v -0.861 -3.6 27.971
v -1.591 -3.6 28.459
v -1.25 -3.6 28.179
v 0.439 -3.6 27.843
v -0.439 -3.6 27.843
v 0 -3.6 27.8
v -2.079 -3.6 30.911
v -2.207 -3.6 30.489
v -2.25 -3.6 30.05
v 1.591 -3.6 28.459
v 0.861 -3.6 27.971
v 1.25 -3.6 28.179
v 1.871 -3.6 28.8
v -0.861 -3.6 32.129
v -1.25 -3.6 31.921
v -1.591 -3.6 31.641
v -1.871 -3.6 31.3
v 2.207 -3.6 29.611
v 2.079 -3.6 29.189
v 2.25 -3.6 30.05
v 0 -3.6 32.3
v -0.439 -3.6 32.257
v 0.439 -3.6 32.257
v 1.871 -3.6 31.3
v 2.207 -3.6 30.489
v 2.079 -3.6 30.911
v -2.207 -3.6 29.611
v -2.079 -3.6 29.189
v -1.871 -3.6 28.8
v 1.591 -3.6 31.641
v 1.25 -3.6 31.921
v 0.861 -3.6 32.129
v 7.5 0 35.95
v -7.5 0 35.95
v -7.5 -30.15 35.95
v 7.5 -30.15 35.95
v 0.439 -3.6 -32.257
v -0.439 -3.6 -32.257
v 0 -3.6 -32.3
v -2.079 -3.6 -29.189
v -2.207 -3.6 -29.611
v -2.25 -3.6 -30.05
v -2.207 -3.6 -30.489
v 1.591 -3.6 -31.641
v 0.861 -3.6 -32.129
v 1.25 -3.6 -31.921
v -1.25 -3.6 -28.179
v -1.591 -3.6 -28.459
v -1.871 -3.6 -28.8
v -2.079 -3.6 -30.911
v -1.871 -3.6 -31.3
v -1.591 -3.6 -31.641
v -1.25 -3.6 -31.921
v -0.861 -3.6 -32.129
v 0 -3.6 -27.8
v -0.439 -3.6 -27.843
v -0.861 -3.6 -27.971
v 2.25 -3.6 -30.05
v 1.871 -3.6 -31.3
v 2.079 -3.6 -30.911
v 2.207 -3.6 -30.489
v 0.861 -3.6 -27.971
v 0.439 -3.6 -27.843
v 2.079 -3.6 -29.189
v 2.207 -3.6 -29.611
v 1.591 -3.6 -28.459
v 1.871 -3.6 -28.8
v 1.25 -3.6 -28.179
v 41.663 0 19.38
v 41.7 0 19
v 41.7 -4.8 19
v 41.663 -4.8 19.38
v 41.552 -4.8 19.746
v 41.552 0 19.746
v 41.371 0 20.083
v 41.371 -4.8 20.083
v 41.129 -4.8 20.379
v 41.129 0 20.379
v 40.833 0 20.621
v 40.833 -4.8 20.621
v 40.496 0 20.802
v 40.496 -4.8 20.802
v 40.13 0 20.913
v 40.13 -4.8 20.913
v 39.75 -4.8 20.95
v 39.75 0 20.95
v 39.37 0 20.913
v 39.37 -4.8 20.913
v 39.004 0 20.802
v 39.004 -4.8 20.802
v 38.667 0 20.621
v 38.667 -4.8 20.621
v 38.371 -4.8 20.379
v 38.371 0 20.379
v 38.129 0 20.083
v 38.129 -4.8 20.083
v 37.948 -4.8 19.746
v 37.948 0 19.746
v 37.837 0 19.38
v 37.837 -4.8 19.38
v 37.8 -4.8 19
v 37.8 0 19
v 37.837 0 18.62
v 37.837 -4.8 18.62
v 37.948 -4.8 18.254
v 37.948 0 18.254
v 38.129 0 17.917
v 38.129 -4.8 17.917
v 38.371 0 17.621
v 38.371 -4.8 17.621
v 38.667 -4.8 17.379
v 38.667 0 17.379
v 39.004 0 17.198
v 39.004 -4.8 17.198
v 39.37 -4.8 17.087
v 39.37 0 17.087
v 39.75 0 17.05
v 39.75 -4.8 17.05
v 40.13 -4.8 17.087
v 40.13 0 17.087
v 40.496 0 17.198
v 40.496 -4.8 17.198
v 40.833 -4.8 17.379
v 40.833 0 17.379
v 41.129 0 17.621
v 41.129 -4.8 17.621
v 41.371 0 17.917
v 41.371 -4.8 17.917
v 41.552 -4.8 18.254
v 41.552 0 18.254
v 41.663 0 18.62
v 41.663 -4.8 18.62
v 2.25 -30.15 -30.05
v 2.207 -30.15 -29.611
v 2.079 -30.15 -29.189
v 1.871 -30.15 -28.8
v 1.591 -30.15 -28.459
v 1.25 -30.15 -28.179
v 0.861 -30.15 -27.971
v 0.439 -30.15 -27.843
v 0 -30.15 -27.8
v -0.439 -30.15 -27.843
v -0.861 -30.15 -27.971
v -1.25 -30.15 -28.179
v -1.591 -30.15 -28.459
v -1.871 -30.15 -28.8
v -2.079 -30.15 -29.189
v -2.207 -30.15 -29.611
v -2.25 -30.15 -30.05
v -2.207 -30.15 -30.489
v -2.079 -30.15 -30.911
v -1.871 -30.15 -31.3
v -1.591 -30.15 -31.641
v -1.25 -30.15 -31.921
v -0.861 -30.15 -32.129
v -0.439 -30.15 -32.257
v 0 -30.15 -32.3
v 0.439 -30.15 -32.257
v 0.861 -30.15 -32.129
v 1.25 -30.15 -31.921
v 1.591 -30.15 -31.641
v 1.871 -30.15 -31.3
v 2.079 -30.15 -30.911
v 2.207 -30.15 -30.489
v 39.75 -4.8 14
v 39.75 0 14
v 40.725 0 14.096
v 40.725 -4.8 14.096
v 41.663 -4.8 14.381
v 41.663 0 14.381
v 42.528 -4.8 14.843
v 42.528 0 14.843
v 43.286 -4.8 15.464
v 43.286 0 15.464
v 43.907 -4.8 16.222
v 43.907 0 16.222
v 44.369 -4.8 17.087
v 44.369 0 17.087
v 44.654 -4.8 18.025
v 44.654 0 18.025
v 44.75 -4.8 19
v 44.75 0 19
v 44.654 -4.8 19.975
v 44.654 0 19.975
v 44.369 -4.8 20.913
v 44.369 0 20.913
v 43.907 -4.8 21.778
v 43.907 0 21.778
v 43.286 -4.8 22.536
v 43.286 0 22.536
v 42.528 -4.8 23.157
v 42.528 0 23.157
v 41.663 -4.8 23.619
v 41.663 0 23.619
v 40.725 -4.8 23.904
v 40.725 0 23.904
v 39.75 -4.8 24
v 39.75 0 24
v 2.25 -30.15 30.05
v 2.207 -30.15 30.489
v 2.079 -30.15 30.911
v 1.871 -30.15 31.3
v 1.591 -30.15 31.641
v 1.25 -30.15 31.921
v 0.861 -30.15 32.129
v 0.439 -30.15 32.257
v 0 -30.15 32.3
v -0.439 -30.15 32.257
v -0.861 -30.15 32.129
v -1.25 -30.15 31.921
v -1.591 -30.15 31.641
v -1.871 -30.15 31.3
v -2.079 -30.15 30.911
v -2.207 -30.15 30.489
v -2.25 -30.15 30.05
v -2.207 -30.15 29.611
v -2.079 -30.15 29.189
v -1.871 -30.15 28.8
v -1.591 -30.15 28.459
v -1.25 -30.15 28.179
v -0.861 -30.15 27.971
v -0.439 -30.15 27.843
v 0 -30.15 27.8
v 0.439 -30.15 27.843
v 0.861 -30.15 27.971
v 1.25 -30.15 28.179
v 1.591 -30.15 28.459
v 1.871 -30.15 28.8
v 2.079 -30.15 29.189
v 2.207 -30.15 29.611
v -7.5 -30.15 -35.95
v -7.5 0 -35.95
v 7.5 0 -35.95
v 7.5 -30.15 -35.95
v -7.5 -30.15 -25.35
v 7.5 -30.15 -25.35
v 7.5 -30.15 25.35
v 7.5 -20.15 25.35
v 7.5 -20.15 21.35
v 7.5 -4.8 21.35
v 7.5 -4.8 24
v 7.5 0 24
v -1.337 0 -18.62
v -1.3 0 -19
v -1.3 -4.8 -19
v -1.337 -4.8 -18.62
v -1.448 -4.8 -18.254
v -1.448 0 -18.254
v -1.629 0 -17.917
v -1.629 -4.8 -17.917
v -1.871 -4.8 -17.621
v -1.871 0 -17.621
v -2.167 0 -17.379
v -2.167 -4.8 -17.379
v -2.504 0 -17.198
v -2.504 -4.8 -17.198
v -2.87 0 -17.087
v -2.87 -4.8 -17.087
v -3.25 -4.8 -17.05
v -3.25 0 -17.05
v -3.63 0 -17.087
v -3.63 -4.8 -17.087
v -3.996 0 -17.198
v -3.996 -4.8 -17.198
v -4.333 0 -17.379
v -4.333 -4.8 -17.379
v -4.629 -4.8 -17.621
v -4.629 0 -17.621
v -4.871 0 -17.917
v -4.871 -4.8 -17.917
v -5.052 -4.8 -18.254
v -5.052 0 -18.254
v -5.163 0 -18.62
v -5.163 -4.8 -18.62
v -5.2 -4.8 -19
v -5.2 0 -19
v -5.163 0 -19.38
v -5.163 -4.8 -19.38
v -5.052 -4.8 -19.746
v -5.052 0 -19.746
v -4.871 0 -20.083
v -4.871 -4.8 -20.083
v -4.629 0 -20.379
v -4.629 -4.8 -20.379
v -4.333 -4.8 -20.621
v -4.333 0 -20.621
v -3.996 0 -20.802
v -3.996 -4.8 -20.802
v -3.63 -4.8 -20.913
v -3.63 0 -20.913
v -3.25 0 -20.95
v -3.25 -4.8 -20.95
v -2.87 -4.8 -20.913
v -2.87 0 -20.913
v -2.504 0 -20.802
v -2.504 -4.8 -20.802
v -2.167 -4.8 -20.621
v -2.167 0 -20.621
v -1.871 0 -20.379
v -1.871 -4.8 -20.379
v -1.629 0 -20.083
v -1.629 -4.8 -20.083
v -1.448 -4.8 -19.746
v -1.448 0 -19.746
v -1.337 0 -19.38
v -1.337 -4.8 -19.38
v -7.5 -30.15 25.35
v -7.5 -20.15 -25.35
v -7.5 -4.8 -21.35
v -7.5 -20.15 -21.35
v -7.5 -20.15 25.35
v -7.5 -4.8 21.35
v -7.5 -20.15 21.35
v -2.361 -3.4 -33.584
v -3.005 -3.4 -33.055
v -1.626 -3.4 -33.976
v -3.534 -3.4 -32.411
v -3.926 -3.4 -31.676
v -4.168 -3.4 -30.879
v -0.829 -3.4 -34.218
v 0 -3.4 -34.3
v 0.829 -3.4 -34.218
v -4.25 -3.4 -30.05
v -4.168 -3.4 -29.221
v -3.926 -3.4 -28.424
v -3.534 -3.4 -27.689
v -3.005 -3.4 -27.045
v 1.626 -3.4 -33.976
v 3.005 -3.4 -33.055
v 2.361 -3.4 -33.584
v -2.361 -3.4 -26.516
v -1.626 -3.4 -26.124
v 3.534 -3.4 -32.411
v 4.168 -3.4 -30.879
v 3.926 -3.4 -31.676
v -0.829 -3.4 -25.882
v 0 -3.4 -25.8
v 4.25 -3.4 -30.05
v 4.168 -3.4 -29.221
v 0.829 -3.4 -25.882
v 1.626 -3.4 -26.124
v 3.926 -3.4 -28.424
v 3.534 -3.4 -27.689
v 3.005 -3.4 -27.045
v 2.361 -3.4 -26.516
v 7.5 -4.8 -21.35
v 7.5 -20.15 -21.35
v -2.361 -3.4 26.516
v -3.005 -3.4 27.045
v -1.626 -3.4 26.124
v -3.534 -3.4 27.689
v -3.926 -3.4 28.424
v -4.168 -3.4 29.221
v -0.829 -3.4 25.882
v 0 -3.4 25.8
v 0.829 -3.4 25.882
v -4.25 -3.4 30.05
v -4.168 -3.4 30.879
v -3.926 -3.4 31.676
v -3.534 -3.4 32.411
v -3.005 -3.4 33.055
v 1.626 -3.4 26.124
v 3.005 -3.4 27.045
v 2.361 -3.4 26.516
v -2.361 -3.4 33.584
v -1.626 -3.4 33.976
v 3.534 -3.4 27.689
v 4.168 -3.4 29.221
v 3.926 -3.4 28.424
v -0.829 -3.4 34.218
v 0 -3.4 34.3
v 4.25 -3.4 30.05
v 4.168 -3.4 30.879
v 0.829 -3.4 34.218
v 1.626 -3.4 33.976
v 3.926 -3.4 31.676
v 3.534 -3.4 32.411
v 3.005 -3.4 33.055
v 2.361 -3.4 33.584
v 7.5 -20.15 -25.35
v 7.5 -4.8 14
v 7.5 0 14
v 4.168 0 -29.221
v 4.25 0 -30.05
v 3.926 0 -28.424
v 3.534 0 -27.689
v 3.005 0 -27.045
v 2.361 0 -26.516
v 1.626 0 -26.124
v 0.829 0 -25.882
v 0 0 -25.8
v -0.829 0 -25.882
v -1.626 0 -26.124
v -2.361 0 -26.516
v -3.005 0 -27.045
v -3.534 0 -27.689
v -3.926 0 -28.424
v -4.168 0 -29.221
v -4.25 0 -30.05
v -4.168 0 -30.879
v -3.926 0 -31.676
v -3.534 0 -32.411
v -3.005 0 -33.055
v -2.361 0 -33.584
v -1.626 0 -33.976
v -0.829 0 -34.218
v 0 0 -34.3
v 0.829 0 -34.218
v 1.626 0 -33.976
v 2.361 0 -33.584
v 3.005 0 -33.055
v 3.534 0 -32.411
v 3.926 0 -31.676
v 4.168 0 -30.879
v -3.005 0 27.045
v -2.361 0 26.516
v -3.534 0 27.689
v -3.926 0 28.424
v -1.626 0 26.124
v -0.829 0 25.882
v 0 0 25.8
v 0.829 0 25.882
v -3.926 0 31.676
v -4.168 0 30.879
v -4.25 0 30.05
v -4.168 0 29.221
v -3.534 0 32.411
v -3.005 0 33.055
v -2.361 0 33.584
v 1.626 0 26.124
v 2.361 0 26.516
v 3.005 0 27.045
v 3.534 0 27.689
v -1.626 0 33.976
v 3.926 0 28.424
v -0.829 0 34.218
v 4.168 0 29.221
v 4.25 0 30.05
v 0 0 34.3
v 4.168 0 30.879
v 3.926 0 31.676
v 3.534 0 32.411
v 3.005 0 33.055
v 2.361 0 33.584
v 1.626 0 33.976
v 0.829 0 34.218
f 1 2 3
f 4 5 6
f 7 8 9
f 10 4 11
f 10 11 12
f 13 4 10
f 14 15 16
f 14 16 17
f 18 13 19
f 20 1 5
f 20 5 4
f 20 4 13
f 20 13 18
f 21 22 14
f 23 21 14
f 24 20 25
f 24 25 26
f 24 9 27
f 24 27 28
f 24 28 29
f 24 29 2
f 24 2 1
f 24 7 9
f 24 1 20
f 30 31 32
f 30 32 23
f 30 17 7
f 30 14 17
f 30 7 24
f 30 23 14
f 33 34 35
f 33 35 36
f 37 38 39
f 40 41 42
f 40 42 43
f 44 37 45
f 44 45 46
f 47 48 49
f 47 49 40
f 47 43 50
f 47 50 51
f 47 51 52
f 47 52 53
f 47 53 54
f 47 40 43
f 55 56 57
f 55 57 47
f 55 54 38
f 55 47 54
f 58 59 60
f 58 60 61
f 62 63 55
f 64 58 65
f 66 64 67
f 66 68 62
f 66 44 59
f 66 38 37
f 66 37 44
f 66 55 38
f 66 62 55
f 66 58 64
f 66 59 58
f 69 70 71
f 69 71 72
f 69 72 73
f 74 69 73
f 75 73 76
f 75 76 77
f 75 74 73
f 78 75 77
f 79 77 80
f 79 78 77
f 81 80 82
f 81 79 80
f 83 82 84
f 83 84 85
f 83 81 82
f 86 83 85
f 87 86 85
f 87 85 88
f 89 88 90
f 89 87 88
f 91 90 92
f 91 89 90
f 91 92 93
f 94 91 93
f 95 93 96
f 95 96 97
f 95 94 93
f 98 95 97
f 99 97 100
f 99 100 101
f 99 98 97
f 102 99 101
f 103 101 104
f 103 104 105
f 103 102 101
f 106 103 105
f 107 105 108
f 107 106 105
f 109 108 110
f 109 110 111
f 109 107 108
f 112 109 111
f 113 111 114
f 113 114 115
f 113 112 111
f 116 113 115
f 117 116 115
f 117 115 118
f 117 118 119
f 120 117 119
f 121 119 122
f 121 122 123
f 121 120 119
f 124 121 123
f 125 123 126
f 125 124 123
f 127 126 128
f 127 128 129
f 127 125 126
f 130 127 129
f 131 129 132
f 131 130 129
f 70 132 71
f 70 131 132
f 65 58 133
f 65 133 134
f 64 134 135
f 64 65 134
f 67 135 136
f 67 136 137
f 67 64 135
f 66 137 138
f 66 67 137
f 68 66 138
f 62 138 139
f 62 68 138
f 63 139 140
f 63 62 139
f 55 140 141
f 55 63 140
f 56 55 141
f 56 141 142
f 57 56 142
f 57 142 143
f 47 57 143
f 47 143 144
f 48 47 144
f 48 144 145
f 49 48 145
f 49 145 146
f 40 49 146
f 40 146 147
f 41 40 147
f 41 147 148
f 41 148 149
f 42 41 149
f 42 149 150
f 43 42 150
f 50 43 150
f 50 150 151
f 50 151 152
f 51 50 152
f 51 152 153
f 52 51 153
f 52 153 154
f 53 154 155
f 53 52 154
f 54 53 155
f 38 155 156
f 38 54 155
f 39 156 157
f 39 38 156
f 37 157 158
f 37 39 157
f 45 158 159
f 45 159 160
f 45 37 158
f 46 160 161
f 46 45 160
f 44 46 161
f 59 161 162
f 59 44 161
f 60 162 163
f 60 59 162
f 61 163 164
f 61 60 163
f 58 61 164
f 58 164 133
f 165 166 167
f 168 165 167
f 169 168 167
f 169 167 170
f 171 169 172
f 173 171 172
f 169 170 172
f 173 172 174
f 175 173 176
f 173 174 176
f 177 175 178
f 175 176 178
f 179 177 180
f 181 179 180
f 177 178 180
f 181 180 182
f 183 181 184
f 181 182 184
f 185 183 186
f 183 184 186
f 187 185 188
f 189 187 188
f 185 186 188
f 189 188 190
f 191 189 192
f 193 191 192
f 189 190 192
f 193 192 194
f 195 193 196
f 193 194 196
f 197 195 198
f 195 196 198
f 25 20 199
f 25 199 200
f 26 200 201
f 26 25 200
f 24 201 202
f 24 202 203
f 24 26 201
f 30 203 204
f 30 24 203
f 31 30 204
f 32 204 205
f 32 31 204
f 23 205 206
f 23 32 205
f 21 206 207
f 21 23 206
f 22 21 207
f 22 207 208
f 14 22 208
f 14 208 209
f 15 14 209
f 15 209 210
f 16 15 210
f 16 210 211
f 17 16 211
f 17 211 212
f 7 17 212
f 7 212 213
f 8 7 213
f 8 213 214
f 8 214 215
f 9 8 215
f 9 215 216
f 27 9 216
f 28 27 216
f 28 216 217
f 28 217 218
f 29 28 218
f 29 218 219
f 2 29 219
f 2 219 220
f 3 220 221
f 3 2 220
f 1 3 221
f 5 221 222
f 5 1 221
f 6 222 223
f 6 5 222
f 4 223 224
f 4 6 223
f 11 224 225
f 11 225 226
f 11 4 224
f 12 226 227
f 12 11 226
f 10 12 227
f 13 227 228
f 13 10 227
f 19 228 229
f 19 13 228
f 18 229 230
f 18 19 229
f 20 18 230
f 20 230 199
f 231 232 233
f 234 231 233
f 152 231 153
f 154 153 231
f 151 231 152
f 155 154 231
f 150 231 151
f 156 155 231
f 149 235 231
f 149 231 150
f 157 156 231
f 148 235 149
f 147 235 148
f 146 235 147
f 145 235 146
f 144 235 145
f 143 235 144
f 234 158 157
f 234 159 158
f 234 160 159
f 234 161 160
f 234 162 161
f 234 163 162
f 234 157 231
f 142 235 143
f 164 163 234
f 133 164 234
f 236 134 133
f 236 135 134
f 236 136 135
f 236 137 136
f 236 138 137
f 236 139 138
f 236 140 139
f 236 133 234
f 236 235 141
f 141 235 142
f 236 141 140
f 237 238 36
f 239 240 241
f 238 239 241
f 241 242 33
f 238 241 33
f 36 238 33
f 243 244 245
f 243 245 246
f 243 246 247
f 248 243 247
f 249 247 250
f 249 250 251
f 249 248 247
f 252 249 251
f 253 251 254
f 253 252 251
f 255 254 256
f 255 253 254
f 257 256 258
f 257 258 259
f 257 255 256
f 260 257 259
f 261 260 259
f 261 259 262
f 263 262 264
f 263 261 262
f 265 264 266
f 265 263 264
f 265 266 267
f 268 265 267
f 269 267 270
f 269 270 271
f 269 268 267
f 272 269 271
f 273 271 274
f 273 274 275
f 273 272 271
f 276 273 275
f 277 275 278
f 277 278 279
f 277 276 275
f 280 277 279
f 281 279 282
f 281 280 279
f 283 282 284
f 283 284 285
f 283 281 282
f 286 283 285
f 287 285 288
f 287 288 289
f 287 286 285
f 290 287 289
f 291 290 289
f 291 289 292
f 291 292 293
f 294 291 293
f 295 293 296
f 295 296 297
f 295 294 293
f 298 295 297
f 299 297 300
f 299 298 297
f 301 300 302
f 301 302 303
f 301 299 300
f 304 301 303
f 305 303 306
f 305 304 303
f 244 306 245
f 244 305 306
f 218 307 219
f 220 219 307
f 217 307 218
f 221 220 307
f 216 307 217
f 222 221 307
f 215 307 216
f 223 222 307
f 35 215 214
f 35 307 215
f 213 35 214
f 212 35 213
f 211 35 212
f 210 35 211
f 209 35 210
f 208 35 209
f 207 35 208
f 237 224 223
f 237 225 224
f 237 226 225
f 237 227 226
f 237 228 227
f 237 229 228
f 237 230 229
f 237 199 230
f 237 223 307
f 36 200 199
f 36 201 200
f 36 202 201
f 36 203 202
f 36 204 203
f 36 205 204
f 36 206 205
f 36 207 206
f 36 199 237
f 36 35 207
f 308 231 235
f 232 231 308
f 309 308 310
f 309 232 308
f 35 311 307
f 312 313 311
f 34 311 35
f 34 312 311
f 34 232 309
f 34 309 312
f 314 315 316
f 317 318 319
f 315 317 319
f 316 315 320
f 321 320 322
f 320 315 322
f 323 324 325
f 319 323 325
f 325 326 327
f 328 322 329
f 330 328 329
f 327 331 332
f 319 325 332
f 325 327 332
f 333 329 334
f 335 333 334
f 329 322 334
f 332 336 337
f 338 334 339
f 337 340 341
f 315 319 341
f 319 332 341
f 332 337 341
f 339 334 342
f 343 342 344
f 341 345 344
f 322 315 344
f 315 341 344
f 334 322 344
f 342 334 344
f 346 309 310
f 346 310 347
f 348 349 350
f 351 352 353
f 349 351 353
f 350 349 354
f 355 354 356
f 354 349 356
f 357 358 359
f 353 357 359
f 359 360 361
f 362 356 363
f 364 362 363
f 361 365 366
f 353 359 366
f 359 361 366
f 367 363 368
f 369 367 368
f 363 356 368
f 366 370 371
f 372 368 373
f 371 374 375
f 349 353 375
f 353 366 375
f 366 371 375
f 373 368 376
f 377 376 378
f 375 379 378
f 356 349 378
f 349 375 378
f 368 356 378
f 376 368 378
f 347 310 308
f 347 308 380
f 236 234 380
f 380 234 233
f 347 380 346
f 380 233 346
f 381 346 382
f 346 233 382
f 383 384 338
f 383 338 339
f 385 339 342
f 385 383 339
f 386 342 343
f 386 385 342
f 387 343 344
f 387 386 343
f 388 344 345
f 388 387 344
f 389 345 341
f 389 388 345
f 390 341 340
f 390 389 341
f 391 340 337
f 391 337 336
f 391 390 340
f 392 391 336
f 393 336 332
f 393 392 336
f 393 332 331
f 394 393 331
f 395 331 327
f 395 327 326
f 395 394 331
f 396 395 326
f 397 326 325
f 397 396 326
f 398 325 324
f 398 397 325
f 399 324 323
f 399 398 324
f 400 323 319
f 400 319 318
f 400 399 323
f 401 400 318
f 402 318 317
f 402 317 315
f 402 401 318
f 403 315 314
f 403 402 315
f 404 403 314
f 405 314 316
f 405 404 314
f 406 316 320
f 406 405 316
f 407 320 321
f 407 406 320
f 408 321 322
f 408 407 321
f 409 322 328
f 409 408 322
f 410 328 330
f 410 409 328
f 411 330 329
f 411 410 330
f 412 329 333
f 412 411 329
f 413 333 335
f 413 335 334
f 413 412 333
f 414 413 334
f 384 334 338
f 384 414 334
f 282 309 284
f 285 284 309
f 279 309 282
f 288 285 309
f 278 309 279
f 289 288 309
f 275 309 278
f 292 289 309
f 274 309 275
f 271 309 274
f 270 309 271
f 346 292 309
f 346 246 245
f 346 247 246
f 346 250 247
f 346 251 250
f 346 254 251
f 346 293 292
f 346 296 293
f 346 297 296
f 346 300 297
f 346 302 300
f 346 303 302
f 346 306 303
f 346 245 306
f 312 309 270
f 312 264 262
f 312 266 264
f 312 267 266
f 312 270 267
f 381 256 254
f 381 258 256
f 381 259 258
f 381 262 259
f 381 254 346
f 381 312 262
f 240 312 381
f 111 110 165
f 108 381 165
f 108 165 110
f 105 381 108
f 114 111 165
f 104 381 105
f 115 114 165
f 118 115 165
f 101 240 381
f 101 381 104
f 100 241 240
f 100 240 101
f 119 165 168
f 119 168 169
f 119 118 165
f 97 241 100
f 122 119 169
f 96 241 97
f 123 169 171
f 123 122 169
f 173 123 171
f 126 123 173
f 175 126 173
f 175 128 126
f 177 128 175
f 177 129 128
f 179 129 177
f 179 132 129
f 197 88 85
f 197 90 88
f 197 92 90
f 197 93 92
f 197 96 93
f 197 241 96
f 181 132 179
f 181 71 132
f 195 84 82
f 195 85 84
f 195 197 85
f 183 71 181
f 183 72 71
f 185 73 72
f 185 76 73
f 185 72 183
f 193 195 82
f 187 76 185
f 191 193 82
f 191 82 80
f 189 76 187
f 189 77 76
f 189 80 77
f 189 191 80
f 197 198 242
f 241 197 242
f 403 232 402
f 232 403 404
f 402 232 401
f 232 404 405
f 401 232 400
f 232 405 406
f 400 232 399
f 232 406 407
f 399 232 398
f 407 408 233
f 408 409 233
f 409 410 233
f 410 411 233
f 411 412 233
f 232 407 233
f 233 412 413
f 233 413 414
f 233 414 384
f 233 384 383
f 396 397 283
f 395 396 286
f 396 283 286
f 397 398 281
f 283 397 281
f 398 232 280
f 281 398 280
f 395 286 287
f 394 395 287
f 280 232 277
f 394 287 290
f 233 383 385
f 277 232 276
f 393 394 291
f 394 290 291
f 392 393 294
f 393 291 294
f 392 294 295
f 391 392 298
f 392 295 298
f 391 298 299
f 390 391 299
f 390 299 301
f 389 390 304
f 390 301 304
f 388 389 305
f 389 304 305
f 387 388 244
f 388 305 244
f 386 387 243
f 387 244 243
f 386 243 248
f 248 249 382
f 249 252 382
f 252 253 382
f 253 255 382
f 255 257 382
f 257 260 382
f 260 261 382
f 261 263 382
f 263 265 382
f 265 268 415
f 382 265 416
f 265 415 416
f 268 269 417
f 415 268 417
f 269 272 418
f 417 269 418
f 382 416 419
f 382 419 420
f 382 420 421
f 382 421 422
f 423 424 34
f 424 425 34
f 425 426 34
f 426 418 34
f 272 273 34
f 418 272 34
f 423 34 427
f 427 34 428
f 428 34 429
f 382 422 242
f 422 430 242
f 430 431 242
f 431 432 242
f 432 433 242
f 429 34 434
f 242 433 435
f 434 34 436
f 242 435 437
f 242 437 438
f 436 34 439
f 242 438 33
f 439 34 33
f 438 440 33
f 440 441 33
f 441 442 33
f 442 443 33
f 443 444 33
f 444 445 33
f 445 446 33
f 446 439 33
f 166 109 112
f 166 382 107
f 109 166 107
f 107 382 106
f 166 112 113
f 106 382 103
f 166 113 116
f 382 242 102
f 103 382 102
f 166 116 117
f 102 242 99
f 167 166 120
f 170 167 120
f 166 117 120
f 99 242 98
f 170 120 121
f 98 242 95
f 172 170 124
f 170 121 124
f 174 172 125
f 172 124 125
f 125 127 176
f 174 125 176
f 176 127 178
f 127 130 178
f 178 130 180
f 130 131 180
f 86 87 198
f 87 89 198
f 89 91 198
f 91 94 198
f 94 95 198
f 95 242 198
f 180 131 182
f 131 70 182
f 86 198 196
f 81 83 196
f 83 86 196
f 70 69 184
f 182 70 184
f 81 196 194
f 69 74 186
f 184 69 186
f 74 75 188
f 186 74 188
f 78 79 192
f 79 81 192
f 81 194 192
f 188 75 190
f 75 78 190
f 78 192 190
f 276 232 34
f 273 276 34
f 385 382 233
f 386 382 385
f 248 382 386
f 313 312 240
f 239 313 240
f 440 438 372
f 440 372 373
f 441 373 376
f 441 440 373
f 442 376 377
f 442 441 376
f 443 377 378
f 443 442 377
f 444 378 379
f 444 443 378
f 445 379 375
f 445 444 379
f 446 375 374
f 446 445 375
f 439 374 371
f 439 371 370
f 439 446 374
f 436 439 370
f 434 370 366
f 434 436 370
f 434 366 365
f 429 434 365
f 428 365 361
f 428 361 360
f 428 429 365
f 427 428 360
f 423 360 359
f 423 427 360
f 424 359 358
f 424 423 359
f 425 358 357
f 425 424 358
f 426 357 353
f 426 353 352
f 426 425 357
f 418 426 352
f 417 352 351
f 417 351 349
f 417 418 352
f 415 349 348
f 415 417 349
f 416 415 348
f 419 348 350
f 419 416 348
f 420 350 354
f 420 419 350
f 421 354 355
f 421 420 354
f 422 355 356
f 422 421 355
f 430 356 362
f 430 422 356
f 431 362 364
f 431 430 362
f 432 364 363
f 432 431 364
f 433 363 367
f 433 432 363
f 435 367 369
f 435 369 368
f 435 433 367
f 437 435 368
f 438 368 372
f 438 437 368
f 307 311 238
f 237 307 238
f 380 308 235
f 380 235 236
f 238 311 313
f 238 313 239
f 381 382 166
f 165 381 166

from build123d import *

# Parameters (mm, degrees)
F0_R     = 1.95
F1_DEPTH = 4.8
F0_W     = 15
F0_H     = 4
F2_DEPTH = 20.15
F0_H_2   = 10.6
F0_R_2   = 4.25
F0_R_3   = 2.25
F3_DEPTH = 30.15
F4_DEPTH = 3.4
F5_DEPTH = 3.6
F6_DEPTH = 3.4


with BuildPart() as f1:
    # F0 (on Front) → F1 (new body)
    with BuildSketch(Plane.XZ):
        Polygon((7.5, 21.35), (-7.5, 21.35), (-7.5, -21.35), (7.5, -21.35), (7.5, 14), align=None)
        with Locations((-3.25, -19)):
            Circle(F0_R, mode=Mode.SUBTRACT)
        with BuildLine():
            Line((39.75, 24), (7.5, 24))
            Line((7.5, 24), (7.5, 21.35))
            Line((7.5, 21.35), (7.5, 14))
            Line((7.5, 14), (39.75, 14))
            ThreePointArc((39.75, 14), (44.75, 19), (39.75, 24))
        make_face()
        with Locations((39.75, 19)):
            Circle(F0_R, mode=Mode.SUBTRACT)
    extrude(amount=F1_DEPTH)

    # F0 (on Front) → F2 (join)
    with BuildSketch(Plane.XZ):
        Polygon((7.5, 24), (7.5, 25.35), (-7.5, 25.35), (-7.5, 21.35), (7.5, 21.35), align=None)
        with Locations((0, -23.35)):
            Rectangle(F0_W, F0_H)
    extrude(amount=F2_DEPTH)

    # F0 (on Front) → F3 (join)
    with BuildSketch(Plane.XZ):
        with Locations((0, 30.65)):
            Rectangle(F0_W, F0_H_2)
        with Locations((0, 30.05)):
            Circle(F0_R_2, mode=Mode.SUBTRACT)
        with Locations((0, 30.05)):
            Circle(F0_R_2)
        with Locations((0, 30.05)):
            Circle(F0_R_3, mode=Mode.SUBTRACT)
        with Locations((0, -30.65)):
            Rectangle(F0_W, F0_H_2)
        with Locations((0, -30.05)):
            Circle(F0_R_2, mode=Mode.SUBTRACT)
        with Locations((0, -30.05)):
            Circle(F0_R_2)
        with Locations((0, -30.05)):
            Circle(F0_R_3, mode=Mode.SUBTRACT)
    extrude(amount=F3_DEPTH)

    # F0 (on Front) → F4 (cut)
    with BuildSketch(Plane.XZ):
        with Locations((0, -30.05)):
            Circle(F0_R_2)
        with Locations((0, -30.05)):
            Circle(F0_R_3, mode=Mode.SUBTRACT)
        with Locations((0, 30.05)):
            Circle(F0_R_2)
        with Locations((0, 30.05)):
            Circle(F0_R_3, mode=Mode.SUBTRACT)
    extrude(amount=F4_DEPTH, mode=Mode.SUBTRACT)

    # F0 (on Front) → F5 (join)
    with BuildSketch(Plane.XZ):
        with Locations((0, 30.05)):
            Circle(F0_R_3)
        with Locations((0, -30.05)):
            Circle(F0_R_3)
    extrude(amount=F5_DEPTH)

    # F0 (on Front) → F6 (cut)
    with BuildSketch(Plane.XZ):
        with Locations((0, -30.05)):
            Circle(F0_R_3)
        with Locations((0, 30.05)):
            Circle(F0_R_3)
    extrude(amount=F6_DEPTH, mode=Mode.SUBTRACT)


solid = f1.part
